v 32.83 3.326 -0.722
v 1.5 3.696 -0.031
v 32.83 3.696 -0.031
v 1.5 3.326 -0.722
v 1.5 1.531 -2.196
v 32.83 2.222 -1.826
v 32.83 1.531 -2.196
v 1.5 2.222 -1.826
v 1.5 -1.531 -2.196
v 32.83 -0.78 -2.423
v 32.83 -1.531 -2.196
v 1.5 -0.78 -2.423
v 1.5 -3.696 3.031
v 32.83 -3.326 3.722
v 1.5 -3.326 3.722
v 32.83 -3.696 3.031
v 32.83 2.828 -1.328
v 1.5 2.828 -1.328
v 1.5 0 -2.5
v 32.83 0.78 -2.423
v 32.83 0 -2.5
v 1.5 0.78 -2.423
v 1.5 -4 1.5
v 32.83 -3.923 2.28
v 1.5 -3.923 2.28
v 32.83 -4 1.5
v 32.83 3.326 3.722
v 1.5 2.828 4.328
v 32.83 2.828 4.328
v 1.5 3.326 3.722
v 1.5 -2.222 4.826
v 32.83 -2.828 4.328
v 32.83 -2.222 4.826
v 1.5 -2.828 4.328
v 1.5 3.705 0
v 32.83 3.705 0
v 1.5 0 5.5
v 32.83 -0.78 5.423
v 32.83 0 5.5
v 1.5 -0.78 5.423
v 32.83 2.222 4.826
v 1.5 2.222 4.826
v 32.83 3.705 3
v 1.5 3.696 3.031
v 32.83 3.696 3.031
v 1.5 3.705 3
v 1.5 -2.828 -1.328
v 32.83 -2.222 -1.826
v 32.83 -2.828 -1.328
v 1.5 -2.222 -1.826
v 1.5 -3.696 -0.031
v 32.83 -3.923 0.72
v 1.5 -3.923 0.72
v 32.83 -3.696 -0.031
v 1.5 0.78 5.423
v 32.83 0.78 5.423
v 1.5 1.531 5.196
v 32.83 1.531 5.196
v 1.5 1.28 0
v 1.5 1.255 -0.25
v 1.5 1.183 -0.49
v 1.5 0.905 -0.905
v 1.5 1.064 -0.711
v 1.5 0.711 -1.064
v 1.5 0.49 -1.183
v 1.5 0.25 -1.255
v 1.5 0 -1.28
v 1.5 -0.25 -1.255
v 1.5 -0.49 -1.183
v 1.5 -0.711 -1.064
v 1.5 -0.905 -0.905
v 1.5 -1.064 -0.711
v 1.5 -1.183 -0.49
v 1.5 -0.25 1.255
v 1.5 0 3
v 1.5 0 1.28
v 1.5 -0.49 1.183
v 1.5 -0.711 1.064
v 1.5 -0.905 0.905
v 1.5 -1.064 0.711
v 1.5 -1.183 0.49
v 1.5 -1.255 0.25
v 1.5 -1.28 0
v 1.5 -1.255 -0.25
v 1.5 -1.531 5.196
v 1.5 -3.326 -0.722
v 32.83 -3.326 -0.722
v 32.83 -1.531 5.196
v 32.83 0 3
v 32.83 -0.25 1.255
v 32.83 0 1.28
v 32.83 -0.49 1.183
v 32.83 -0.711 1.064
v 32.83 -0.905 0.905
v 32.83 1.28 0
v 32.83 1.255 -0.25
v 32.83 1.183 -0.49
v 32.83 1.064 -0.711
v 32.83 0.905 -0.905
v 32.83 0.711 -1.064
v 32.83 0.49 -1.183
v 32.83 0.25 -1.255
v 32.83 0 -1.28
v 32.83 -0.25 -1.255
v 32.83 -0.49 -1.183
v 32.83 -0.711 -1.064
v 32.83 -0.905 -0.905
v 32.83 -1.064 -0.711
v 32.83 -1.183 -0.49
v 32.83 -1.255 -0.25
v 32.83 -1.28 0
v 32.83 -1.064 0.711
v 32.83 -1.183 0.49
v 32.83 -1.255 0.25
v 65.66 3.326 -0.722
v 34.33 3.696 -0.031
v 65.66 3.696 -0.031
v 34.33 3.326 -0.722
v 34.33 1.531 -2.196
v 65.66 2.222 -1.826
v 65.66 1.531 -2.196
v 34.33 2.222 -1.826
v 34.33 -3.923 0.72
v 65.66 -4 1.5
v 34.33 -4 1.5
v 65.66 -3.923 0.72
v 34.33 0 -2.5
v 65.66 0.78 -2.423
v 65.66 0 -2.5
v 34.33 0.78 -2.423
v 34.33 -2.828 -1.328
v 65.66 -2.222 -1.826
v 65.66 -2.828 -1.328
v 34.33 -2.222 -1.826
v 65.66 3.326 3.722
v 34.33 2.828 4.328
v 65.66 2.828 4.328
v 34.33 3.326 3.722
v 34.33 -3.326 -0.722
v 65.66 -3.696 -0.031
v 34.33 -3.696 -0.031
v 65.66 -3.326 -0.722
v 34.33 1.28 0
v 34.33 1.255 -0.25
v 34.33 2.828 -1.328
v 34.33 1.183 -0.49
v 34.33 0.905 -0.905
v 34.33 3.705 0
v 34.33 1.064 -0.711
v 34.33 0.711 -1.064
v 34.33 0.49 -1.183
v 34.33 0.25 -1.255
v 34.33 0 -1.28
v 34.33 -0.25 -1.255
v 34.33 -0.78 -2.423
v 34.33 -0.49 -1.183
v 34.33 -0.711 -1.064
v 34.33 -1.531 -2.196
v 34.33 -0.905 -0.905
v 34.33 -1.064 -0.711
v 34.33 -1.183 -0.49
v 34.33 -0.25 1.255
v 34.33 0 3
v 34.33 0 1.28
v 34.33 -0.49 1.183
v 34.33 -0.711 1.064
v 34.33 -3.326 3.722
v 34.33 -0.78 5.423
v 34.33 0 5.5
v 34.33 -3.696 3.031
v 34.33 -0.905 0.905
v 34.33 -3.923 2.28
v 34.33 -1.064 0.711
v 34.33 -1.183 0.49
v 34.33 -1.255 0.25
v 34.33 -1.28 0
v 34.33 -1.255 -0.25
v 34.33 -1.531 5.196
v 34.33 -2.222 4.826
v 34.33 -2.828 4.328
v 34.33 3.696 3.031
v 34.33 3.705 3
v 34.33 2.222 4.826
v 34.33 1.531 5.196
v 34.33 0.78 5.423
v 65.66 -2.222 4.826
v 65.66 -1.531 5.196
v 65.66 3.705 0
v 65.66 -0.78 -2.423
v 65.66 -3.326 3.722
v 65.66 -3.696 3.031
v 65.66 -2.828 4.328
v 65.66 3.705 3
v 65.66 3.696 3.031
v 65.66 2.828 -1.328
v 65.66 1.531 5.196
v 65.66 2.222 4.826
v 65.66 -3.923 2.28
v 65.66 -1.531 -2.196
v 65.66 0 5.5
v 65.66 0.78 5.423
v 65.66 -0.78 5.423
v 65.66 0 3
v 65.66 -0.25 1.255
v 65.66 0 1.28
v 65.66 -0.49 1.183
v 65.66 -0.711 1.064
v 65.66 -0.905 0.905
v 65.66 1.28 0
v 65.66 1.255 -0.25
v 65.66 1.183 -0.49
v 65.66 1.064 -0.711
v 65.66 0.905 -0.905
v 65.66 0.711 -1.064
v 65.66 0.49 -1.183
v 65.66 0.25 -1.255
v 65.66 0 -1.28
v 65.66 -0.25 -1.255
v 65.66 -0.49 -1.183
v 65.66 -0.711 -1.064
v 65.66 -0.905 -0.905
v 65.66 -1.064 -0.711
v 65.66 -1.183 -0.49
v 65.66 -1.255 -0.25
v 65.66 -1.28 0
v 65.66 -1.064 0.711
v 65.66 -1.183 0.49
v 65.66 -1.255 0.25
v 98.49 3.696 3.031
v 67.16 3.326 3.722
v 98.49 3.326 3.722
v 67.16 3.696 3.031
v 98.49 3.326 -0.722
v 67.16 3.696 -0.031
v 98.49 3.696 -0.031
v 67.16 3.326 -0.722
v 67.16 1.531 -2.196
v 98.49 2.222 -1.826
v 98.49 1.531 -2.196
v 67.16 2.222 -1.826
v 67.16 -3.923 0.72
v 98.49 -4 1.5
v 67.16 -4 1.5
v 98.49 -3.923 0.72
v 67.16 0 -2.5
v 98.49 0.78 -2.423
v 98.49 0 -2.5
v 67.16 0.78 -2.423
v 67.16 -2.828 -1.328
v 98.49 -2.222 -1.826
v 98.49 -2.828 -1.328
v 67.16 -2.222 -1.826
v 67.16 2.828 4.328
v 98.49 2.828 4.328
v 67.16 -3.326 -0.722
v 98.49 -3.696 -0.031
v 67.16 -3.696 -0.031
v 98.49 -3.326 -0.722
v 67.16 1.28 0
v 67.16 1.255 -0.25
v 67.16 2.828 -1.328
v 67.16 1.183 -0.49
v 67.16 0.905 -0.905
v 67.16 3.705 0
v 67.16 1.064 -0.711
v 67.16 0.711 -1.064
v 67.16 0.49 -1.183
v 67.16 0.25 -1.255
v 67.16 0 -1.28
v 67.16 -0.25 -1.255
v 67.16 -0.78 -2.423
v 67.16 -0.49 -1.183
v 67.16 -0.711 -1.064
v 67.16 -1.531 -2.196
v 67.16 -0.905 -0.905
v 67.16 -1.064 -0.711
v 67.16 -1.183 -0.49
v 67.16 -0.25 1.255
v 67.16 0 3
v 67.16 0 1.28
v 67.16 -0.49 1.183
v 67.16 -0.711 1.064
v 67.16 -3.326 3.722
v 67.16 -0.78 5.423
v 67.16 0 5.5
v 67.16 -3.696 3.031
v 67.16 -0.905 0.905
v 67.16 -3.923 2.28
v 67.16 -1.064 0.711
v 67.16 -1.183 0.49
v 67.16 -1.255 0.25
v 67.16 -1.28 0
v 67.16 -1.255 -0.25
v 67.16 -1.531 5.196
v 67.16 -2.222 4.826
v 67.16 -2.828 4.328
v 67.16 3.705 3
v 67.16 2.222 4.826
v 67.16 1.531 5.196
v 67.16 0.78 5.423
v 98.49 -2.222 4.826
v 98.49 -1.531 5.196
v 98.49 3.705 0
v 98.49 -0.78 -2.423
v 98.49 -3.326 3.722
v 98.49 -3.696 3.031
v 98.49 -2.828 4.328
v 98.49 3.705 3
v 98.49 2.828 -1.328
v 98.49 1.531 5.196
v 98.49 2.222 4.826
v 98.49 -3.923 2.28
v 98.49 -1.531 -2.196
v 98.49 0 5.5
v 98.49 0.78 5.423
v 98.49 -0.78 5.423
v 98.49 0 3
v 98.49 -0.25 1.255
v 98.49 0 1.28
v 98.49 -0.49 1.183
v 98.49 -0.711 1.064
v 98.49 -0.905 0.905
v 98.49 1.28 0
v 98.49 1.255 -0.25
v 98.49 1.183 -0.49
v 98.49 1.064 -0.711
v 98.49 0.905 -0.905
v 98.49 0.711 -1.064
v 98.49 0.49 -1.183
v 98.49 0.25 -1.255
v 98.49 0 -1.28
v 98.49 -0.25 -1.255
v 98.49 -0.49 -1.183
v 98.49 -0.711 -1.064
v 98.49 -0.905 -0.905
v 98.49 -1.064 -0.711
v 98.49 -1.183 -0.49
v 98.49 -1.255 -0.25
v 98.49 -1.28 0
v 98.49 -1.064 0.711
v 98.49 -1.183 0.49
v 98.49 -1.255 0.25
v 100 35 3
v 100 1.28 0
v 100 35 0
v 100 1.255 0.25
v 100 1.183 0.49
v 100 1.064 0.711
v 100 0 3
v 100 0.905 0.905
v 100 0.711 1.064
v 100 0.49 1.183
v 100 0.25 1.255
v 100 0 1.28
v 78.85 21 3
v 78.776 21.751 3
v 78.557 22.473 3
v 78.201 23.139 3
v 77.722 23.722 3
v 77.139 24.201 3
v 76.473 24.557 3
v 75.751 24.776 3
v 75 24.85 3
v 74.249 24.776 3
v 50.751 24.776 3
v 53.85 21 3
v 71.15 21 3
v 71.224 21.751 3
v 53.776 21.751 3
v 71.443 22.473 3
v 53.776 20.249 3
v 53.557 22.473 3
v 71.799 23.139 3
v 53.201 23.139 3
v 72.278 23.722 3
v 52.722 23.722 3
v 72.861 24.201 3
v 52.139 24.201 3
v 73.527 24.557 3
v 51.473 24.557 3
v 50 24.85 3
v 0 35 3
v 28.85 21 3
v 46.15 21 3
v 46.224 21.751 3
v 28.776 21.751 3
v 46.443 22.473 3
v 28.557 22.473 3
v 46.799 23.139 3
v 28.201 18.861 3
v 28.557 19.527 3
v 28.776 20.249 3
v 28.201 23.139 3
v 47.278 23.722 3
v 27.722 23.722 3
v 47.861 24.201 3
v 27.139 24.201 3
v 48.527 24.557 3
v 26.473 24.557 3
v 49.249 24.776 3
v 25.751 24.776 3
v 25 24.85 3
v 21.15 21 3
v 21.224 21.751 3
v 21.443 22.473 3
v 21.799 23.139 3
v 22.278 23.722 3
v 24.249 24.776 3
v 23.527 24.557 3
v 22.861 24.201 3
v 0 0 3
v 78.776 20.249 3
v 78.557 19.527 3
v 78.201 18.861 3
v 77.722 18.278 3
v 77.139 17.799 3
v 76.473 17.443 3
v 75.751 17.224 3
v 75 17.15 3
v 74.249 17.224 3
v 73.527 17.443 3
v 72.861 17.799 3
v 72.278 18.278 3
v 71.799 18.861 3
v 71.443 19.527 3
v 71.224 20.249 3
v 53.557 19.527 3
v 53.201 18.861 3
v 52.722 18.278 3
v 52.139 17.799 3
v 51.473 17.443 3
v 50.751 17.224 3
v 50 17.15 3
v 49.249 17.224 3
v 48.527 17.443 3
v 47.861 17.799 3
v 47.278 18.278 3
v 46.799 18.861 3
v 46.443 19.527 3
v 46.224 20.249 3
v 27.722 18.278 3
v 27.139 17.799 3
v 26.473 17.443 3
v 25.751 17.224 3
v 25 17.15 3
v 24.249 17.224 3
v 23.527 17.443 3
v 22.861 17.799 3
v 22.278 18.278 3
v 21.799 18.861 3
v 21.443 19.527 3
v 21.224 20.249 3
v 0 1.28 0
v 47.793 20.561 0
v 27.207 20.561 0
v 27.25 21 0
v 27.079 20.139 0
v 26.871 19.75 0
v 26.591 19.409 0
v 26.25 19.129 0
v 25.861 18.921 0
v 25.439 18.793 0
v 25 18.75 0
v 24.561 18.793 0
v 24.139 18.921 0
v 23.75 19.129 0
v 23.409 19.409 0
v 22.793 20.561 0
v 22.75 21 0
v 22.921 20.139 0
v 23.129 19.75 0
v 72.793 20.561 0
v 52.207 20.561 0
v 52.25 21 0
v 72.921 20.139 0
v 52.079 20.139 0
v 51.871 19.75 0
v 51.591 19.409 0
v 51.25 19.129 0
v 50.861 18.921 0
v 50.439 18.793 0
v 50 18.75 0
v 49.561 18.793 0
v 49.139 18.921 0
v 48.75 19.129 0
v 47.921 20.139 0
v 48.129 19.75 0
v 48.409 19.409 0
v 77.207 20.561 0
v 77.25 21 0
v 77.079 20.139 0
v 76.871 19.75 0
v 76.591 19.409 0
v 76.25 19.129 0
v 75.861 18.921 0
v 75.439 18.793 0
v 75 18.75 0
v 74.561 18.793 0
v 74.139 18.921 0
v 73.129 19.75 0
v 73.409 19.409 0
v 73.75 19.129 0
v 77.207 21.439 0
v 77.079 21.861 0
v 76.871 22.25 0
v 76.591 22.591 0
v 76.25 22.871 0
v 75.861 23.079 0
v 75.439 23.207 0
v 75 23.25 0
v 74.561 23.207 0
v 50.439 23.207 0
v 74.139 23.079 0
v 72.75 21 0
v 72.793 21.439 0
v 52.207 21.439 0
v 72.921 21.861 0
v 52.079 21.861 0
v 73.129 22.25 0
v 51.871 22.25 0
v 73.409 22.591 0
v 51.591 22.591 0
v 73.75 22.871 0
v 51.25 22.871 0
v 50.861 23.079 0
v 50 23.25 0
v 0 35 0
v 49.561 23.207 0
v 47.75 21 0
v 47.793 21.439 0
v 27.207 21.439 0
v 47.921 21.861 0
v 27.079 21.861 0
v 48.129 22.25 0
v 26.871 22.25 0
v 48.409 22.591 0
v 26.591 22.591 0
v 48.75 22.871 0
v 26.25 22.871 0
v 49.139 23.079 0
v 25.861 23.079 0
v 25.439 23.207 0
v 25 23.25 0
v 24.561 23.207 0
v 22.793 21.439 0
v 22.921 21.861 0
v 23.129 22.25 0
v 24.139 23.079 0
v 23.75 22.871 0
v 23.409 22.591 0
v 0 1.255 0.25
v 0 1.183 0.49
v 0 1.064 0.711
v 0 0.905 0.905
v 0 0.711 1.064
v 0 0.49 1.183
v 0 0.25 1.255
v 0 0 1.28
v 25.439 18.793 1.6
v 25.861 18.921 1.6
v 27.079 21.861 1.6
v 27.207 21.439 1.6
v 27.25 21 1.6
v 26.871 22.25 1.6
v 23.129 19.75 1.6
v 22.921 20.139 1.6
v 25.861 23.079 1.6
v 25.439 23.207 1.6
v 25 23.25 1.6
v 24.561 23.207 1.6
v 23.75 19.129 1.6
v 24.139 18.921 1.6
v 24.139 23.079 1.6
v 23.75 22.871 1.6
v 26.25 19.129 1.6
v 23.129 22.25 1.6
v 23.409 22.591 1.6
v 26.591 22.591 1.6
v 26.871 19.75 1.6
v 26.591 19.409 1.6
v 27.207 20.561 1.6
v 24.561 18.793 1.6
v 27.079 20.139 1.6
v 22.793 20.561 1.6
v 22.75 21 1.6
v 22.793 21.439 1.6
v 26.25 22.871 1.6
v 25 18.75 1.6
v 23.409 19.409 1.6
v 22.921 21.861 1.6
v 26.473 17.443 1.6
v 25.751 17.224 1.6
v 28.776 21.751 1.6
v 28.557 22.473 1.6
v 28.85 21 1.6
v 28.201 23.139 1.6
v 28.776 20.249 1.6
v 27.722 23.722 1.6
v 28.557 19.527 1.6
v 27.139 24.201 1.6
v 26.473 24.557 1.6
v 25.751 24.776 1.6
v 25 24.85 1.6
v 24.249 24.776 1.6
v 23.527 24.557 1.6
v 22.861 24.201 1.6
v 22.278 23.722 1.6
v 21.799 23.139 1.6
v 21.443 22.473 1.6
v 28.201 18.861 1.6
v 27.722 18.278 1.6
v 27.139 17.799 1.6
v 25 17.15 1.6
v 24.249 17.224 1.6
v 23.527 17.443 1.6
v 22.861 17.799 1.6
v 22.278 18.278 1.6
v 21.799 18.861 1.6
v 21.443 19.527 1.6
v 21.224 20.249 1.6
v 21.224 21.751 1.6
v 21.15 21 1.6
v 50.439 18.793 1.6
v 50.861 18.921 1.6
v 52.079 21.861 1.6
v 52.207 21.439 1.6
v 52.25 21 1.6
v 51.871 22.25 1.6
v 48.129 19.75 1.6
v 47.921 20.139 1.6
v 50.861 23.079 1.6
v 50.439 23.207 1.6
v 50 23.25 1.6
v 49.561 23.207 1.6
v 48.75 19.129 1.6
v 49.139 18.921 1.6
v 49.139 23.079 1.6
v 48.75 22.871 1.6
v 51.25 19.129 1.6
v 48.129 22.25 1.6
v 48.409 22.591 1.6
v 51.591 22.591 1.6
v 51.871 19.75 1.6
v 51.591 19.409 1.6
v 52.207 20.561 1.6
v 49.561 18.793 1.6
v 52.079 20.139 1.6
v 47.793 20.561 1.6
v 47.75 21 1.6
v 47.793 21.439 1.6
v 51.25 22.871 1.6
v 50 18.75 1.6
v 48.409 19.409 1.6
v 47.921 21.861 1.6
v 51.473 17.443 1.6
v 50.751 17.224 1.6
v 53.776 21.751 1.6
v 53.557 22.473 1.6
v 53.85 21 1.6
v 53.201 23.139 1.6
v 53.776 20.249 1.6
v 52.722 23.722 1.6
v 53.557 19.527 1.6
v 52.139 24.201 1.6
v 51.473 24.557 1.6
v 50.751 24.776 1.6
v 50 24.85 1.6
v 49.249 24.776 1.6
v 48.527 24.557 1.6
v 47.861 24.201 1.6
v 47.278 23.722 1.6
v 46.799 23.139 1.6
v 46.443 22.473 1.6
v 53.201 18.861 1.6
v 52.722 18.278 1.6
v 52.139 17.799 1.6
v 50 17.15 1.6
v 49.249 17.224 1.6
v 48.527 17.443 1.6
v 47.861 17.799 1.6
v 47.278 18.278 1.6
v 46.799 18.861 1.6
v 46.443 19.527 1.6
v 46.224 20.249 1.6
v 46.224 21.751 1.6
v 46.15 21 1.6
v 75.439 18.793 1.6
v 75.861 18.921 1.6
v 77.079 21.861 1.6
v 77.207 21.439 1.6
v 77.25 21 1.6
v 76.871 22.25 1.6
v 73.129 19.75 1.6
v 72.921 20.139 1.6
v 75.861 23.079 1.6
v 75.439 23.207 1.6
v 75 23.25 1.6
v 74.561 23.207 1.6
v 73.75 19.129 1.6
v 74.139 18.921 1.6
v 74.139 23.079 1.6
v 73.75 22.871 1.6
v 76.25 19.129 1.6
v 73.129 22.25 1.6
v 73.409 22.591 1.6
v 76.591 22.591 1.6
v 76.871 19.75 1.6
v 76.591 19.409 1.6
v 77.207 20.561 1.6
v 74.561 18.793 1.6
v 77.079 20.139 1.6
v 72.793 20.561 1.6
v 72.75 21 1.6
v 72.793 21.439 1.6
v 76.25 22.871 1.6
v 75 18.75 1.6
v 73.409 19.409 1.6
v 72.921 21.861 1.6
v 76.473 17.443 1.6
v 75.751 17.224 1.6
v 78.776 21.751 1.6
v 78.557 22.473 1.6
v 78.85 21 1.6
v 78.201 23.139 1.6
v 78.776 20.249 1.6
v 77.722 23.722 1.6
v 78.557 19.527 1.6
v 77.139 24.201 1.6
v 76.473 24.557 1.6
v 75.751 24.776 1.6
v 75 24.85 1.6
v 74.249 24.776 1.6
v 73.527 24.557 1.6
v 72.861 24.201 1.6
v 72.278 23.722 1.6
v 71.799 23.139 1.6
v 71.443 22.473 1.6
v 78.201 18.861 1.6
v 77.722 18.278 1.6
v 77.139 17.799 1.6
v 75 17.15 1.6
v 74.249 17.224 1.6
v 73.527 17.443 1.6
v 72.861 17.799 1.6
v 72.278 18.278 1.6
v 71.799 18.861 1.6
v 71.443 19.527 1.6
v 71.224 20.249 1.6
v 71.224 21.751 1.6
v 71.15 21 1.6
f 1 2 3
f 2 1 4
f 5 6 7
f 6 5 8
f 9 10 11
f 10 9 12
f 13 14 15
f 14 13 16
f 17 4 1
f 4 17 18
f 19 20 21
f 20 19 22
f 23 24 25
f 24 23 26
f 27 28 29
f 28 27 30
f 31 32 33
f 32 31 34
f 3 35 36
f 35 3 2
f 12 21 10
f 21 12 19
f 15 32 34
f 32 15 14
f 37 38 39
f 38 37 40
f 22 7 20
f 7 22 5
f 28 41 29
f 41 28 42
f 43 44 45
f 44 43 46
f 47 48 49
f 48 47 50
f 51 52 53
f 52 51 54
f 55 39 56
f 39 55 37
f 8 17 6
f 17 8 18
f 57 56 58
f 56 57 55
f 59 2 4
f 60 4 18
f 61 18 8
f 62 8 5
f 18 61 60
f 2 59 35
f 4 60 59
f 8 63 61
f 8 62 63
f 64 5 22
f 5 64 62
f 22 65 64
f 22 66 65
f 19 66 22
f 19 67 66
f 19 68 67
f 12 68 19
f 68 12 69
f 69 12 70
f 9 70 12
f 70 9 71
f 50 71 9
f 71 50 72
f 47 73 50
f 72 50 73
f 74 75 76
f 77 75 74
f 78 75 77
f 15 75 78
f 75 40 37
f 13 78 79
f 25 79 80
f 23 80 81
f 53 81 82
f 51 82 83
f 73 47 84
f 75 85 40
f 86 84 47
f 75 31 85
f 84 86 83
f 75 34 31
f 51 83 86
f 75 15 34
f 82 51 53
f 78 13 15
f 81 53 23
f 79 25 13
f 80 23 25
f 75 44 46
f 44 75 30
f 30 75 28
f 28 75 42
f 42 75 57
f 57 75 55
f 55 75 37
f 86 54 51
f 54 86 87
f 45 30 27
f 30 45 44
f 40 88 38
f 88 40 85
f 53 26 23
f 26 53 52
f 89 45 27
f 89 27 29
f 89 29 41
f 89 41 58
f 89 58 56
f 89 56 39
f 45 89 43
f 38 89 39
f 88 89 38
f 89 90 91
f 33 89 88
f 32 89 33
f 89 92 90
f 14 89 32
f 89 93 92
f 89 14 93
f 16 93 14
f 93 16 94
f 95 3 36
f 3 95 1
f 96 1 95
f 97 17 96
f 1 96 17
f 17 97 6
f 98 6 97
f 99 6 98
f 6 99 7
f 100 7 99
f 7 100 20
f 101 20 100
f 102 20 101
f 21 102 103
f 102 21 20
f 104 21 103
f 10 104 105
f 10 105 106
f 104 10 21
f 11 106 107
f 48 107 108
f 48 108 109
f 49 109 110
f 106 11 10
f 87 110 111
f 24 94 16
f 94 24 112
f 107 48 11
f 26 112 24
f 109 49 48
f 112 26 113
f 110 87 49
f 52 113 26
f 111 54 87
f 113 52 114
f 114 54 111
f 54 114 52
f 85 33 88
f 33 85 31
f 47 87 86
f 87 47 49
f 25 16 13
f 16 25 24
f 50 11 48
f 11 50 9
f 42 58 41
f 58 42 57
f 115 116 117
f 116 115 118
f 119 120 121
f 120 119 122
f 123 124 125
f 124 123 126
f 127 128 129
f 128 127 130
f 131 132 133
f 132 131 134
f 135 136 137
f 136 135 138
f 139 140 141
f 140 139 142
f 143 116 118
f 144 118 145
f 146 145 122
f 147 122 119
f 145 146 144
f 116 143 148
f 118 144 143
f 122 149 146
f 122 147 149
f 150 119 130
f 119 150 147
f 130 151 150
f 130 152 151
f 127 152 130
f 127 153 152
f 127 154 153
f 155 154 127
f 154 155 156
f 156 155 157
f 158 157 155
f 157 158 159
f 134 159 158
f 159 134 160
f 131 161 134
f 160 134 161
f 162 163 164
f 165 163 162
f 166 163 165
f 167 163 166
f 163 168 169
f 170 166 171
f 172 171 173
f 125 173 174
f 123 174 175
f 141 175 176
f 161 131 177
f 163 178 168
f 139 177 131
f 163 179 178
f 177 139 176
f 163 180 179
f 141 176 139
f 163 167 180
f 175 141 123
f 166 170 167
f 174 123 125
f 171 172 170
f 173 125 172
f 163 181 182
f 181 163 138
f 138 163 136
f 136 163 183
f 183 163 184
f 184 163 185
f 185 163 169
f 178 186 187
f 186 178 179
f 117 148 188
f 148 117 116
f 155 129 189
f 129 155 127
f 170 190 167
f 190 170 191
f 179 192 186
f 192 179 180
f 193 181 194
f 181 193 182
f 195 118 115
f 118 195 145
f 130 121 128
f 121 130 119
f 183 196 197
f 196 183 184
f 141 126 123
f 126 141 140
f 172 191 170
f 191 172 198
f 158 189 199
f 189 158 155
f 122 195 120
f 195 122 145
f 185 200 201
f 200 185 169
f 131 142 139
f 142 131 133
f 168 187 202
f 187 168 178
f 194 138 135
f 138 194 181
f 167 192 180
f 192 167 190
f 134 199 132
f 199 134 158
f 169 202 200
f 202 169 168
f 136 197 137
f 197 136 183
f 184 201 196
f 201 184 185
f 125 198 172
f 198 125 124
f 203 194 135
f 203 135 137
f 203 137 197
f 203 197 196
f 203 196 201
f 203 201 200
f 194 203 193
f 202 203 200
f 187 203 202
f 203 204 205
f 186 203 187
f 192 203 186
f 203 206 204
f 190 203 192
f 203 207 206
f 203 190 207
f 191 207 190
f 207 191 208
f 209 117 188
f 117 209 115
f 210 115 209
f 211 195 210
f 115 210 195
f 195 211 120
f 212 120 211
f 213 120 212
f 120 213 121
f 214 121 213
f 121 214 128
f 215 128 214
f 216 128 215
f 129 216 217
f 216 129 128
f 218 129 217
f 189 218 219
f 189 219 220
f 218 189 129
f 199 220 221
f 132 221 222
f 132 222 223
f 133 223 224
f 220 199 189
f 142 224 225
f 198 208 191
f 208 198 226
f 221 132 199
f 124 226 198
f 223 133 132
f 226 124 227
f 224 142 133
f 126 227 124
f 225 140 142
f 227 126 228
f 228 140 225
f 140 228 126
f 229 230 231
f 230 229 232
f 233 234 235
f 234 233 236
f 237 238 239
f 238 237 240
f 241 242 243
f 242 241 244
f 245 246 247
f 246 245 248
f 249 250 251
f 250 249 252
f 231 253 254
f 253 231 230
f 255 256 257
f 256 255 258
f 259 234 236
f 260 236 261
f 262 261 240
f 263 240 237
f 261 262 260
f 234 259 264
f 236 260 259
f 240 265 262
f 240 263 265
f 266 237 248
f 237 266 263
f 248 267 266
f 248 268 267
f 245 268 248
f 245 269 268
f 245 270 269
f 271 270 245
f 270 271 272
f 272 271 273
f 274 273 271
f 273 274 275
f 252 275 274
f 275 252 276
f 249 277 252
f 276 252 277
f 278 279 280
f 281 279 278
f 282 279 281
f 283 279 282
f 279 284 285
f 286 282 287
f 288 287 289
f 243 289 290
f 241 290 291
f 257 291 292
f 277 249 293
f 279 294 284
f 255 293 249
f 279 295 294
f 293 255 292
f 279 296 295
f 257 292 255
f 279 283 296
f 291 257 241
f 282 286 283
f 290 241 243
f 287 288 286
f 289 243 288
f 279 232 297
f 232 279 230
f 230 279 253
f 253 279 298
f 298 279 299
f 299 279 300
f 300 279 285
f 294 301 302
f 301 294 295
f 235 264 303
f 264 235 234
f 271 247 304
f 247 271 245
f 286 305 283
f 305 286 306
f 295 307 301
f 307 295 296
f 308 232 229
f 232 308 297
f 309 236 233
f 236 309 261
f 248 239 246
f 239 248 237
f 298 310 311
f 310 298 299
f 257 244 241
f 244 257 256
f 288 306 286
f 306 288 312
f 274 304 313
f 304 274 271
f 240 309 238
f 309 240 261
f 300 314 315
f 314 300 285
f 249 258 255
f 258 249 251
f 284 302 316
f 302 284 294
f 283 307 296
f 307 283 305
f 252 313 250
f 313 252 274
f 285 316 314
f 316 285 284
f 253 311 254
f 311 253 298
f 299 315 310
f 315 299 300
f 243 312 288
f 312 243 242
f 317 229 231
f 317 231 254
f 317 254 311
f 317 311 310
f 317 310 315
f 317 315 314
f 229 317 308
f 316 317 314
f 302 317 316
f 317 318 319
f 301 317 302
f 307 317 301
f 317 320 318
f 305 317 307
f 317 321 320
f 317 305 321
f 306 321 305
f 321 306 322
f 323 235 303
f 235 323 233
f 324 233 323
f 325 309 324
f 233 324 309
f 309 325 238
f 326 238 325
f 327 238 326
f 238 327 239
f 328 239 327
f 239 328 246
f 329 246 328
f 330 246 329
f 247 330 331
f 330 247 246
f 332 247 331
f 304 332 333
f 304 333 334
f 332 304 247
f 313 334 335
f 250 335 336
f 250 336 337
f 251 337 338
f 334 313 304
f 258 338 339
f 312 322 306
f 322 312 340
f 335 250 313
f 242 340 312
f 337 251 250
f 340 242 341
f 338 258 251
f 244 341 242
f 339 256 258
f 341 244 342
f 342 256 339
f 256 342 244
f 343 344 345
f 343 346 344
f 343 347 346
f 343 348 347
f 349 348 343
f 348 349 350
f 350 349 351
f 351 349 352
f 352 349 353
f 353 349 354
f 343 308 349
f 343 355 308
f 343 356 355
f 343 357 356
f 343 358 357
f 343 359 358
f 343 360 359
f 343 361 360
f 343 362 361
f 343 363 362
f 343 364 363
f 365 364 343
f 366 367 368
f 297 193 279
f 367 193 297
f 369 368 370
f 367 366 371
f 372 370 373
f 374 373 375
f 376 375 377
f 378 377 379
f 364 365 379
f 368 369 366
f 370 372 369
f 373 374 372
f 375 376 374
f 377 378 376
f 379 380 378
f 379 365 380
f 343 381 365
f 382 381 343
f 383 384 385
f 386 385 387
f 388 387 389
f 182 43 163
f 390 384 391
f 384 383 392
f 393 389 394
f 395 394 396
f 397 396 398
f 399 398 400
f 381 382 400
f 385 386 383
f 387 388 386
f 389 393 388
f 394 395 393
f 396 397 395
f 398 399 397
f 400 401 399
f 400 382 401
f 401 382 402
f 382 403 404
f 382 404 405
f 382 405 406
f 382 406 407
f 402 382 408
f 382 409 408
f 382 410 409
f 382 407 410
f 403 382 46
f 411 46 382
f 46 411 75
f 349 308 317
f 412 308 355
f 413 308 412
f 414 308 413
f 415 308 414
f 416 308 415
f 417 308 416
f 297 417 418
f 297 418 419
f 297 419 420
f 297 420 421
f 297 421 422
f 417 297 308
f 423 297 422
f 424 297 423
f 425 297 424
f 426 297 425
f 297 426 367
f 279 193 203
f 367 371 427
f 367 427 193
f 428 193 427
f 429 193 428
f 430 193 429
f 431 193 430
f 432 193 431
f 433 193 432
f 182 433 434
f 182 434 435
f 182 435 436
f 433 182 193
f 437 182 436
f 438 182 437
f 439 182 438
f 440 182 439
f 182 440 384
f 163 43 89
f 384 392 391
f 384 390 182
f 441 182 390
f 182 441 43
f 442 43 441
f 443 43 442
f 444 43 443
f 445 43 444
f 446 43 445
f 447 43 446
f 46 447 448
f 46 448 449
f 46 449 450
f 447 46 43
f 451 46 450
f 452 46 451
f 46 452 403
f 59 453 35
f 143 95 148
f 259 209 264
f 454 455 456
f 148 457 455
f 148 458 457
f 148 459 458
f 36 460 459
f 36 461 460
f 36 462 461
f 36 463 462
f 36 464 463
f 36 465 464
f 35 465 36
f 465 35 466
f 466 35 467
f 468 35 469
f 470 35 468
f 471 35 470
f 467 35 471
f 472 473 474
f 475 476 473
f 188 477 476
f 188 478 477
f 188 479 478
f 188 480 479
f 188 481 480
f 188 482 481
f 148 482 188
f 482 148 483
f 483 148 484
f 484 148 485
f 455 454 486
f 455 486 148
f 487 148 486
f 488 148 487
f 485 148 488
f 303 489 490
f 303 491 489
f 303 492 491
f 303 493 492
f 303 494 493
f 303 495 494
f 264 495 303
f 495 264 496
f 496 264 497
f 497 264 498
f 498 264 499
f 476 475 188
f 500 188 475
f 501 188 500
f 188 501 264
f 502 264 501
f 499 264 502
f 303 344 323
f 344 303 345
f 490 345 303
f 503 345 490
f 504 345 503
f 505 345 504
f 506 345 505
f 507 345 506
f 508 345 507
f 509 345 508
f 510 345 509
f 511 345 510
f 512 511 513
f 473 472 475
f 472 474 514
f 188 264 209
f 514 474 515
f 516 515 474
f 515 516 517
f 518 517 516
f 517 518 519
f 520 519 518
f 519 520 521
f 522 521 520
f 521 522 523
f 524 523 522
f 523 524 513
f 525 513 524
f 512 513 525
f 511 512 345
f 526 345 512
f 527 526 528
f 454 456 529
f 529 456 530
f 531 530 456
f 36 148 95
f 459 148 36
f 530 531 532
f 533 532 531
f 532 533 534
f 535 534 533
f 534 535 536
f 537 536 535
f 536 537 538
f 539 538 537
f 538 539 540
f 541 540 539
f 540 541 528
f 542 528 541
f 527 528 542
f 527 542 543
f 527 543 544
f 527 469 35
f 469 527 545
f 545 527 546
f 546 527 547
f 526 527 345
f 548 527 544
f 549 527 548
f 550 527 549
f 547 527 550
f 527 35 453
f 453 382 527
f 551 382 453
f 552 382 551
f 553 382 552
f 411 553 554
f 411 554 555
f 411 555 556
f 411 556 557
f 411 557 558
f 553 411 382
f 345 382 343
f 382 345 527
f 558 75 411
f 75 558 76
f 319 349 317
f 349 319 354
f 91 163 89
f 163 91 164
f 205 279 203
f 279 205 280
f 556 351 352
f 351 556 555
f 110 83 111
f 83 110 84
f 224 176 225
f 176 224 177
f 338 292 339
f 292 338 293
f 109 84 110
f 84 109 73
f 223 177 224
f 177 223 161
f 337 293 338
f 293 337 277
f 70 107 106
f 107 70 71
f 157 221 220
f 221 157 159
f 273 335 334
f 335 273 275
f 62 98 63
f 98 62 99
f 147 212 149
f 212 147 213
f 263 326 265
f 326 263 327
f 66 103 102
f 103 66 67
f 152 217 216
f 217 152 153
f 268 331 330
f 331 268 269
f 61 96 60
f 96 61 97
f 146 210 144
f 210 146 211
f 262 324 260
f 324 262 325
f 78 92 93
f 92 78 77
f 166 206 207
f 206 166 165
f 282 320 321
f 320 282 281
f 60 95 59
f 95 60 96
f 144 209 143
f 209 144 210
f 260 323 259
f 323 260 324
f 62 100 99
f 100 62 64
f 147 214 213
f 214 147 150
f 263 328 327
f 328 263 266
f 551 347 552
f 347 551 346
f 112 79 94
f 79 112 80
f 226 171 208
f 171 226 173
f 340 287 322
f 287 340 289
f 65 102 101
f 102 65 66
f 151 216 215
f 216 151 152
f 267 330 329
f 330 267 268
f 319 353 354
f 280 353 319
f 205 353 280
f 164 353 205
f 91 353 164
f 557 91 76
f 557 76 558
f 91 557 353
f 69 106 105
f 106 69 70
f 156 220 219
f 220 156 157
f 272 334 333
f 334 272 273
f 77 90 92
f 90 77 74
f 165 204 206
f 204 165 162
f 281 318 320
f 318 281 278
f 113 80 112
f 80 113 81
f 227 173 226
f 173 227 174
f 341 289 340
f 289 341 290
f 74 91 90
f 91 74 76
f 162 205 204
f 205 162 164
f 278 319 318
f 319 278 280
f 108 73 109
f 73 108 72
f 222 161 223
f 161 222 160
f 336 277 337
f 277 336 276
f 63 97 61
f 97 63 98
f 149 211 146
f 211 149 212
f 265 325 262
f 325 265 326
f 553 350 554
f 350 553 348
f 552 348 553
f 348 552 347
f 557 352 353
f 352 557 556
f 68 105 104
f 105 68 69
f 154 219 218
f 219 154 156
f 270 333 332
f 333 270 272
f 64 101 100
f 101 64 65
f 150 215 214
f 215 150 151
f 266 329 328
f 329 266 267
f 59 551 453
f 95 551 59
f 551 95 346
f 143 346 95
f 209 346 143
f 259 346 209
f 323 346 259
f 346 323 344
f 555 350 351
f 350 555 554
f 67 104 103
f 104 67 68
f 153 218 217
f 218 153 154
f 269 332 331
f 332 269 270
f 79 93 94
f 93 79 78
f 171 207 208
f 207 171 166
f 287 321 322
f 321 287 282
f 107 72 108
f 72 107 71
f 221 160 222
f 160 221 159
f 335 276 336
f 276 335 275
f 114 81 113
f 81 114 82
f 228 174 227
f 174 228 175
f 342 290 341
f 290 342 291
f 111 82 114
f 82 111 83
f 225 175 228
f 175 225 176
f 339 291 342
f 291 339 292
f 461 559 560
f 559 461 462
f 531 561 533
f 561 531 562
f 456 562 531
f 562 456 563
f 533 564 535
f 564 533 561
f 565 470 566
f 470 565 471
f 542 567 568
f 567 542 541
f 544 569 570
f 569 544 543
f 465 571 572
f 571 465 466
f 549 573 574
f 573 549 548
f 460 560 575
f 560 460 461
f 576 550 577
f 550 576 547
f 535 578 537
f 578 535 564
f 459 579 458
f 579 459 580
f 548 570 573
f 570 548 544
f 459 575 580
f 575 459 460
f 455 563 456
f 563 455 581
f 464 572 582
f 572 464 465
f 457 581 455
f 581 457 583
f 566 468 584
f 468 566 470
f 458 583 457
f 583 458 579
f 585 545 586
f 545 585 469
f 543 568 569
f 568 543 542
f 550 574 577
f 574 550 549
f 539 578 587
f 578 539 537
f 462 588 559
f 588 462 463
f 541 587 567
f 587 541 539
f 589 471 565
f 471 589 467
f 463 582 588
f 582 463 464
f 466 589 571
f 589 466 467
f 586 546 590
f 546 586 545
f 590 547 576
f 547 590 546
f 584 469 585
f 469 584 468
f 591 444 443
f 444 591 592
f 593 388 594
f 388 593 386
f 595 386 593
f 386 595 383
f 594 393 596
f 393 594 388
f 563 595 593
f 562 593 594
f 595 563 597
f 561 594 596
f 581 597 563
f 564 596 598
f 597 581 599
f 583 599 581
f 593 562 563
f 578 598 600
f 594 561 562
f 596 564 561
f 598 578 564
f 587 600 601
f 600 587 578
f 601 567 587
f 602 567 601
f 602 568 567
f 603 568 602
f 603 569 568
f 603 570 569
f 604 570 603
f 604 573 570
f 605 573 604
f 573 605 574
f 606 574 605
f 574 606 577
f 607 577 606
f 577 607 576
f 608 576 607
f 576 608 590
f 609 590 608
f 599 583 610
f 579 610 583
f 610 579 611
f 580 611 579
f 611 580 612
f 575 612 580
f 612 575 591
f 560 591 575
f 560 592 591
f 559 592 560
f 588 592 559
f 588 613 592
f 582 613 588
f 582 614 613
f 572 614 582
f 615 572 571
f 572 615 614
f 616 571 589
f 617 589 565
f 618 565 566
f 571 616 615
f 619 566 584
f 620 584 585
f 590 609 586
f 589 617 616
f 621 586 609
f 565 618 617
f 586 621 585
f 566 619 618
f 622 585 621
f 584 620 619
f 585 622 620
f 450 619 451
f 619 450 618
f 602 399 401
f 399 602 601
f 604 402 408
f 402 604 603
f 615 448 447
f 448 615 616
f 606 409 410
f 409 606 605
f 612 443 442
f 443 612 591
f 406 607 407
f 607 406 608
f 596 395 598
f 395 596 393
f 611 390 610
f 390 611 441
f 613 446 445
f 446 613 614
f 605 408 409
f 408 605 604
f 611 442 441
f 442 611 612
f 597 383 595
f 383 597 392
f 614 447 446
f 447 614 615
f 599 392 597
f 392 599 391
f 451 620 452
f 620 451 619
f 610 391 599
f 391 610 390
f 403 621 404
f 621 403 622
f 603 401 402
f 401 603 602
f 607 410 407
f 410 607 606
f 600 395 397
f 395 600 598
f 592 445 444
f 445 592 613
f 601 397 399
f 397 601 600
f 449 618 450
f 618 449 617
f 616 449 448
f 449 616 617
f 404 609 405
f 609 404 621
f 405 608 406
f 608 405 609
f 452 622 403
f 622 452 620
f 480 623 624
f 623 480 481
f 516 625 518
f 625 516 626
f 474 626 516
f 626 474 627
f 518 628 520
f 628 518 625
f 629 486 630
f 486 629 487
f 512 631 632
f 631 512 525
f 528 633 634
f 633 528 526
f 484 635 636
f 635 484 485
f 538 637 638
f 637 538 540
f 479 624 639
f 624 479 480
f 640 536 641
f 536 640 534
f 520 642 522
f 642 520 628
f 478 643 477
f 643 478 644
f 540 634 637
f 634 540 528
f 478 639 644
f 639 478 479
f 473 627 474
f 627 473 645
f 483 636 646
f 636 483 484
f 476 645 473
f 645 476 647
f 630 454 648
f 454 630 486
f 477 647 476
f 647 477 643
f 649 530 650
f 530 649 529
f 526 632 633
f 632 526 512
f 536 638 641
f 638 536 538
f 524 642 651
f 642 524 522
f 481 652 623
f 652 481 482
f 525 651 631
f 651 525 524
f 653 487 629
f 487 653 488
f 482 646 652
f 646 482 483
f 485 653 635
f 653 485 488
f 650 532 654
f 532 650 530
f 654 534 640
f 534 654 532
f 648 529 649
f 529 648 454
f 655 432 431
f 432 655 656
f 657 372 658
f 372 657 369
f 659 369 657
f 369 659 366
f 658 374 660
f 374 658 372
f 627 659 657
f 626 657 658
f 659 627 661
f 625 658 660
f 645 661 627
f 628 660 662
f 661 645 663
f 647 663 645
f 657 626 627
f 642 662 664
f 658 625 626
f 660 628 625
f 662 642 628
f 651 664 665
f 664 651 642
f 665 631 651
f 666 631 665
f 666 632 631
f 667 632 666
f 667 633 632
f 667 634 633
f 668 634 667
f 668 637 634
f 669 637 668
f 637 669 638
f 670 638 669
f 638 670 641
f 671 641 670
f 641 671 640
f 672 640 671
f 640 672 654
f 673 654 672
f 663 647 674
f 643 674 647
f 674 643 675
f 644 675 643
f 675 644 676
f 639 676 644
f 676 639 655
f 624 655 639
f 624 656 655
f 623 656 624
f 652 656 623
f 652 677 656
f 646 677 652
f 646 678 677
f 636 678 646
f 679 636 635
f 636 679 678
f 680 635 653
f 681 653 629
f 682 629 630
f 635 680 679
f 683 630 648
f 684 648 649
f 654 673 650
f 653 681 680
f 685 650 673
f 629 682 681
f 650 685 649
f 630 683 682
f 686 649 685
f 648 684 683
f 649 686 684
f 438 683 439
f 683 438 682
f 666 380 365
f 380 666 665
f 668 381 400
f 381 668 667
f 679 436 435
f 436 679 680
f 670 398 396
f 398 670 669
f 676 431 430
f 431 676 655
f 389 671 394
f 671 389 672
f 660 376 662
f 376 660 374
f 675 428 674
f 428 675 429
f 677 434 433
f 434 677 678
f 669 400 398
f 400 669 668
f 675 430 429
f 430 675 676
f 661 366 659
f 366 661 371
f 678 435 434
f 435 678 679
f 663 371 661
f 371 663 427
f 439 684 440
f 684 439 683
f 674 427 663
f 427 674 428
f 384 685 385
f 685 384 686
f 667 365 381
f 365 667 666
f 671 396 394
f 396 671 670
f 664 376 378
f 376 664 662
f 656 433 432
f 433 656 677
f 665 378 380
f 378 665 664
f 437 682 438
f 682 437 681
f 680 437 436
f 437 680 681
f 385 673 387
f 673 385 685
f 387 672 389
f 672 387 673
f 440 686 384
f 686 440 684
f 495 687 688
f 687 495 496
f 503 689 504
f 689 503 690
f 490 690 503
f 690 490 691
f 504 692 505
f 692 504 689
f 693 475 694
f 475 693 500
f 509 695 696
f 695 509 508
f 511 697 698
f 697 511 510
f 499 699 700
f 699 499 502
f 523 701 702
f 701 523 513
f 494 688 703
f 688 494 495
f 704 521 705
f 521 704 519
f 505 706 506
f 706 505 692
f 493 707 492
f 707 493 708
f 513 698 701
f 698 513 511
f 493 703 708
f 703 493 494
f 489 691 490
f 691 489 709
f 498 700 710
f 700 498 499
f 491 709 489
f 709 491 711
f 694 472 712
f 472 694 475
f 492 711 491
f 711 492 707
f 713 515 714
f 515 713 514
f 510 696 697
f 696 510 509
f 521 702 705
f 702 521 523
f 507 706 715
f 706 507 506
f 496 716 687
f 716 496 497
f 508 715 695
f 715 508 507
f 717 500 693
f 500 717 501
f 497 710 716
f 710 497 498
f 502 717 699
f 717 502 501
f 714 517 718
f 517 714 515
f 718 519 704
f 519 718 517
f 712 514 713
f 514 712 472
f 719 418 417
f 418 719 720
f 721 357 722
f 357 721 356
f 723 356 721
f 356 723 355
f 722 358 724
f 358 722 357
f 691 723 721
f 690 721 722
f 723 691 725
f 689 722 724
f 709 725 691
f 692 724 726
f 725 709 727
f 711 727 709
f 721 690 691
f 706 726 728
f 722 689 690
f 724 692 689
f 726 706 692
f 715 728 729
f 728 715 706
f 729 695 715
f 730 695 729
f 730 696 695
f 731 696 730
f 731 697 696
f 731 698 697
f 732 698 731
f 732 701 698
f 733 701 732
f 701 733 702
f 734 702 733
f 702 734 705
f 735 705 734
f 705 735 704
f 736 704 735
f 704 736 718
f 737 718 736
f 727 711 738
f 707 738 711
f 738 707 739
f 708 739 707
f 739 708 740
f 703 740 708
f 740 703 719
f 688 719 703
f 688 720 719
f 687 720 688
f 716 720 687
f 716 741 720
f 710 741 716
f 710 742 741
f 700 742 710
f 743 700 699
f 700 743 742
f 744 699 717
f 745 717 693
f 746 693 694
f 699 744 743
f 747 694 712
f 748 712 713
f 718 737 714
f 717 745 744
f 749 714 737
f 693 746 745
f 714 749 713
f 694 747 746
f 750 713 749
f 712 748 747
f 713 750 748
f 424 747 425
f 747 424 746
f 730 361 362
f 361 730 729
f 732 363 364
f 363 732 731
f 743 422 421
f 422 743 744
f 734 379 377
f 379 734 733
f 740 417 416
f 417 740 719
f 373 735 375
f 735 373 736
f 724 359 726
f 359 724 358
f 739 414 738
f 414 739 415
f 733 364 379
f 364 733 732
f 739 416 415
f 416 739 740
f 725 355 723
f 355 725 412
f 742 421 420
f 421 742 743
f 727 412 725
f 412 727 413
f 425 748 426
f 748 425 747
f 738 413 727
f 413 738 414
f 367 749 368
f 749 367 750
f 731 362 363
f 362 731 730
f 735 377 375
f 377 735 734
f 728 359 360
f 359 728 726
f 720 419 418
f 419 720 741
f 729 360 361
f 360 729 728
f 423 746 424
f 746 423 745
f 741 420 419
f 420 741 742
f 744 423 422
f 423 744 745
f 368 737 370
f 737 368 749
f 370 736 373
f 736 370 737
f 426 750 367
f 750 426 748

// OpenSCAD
$fn = 32;

// ----------------------------------------------------------------------
// Hinge leaf: 100 x 39 x 8 mm
// ----------------------------------------------------------------------

// --- parameters (mm) ---
plate_len = 100;          // leaf length, X
plate_w = 35;             // leaf width, Y
plate_t = 3;              // leaf thickness
barrel_d = 8;             // knuckle diameter
barrel_w = 31.33;         // knuckle width
knuckle_n = 3;            // number of knuckles
pin_d = 2.56;             // pin bore
gap = 1.5;                // gap between the knuckles
screw_d = 4.5;            // screw clearance
cs_d = 7.7;               // countersink diameter
cs_h = 1.4;               // countersink depth

module leaf() {
  cube([plate_len, plate_w, plate_t]);
}

module knuckles() {
  /* barrels sit on the leaf edge, the pin axis at half the leaf thickness */
  for (i = [0 : knuckle_n - 1])
    translate([gap + i * (barrel_w + gap), 0, plate_t * 0.5])
      rotate([0, 90, 0]) cylinder(h = barrel_w, d = barrel_d);
}

difference() {
  union() {
    leaf();
    knuckles();
  }
  rotate([0, 90, 0]) translate([0, 0, -1])
    cylinder(h = plate_len + 2, d = pin_d);
  translate([25, plate_w * 0.6, -1]) cylinder(h = plate_t + 2, d = screw_d);
  translate([25, plate_w * 0.6, plate_t - cs_h]) cylinder(h = cs_h + 0.5, d = cs_d);
  translate([50, plate_w * 0.6, -1]) cylinder(h = plate_t + 2, d = screw_d);
  translate([50, plate_w * 0.6, plate_t - cs_h]) cylinder(h = cs_h + 0.5, d = cs_d);
  translate([75, plate_w * 0.6, -1]) cylinder(h = plate_t + 2, d = screw_d);
  translate([75, plate_w * 0.6, plate_t - cs_h]) cylinder(h = cs_h + 0.5, d = cs_d);
}
